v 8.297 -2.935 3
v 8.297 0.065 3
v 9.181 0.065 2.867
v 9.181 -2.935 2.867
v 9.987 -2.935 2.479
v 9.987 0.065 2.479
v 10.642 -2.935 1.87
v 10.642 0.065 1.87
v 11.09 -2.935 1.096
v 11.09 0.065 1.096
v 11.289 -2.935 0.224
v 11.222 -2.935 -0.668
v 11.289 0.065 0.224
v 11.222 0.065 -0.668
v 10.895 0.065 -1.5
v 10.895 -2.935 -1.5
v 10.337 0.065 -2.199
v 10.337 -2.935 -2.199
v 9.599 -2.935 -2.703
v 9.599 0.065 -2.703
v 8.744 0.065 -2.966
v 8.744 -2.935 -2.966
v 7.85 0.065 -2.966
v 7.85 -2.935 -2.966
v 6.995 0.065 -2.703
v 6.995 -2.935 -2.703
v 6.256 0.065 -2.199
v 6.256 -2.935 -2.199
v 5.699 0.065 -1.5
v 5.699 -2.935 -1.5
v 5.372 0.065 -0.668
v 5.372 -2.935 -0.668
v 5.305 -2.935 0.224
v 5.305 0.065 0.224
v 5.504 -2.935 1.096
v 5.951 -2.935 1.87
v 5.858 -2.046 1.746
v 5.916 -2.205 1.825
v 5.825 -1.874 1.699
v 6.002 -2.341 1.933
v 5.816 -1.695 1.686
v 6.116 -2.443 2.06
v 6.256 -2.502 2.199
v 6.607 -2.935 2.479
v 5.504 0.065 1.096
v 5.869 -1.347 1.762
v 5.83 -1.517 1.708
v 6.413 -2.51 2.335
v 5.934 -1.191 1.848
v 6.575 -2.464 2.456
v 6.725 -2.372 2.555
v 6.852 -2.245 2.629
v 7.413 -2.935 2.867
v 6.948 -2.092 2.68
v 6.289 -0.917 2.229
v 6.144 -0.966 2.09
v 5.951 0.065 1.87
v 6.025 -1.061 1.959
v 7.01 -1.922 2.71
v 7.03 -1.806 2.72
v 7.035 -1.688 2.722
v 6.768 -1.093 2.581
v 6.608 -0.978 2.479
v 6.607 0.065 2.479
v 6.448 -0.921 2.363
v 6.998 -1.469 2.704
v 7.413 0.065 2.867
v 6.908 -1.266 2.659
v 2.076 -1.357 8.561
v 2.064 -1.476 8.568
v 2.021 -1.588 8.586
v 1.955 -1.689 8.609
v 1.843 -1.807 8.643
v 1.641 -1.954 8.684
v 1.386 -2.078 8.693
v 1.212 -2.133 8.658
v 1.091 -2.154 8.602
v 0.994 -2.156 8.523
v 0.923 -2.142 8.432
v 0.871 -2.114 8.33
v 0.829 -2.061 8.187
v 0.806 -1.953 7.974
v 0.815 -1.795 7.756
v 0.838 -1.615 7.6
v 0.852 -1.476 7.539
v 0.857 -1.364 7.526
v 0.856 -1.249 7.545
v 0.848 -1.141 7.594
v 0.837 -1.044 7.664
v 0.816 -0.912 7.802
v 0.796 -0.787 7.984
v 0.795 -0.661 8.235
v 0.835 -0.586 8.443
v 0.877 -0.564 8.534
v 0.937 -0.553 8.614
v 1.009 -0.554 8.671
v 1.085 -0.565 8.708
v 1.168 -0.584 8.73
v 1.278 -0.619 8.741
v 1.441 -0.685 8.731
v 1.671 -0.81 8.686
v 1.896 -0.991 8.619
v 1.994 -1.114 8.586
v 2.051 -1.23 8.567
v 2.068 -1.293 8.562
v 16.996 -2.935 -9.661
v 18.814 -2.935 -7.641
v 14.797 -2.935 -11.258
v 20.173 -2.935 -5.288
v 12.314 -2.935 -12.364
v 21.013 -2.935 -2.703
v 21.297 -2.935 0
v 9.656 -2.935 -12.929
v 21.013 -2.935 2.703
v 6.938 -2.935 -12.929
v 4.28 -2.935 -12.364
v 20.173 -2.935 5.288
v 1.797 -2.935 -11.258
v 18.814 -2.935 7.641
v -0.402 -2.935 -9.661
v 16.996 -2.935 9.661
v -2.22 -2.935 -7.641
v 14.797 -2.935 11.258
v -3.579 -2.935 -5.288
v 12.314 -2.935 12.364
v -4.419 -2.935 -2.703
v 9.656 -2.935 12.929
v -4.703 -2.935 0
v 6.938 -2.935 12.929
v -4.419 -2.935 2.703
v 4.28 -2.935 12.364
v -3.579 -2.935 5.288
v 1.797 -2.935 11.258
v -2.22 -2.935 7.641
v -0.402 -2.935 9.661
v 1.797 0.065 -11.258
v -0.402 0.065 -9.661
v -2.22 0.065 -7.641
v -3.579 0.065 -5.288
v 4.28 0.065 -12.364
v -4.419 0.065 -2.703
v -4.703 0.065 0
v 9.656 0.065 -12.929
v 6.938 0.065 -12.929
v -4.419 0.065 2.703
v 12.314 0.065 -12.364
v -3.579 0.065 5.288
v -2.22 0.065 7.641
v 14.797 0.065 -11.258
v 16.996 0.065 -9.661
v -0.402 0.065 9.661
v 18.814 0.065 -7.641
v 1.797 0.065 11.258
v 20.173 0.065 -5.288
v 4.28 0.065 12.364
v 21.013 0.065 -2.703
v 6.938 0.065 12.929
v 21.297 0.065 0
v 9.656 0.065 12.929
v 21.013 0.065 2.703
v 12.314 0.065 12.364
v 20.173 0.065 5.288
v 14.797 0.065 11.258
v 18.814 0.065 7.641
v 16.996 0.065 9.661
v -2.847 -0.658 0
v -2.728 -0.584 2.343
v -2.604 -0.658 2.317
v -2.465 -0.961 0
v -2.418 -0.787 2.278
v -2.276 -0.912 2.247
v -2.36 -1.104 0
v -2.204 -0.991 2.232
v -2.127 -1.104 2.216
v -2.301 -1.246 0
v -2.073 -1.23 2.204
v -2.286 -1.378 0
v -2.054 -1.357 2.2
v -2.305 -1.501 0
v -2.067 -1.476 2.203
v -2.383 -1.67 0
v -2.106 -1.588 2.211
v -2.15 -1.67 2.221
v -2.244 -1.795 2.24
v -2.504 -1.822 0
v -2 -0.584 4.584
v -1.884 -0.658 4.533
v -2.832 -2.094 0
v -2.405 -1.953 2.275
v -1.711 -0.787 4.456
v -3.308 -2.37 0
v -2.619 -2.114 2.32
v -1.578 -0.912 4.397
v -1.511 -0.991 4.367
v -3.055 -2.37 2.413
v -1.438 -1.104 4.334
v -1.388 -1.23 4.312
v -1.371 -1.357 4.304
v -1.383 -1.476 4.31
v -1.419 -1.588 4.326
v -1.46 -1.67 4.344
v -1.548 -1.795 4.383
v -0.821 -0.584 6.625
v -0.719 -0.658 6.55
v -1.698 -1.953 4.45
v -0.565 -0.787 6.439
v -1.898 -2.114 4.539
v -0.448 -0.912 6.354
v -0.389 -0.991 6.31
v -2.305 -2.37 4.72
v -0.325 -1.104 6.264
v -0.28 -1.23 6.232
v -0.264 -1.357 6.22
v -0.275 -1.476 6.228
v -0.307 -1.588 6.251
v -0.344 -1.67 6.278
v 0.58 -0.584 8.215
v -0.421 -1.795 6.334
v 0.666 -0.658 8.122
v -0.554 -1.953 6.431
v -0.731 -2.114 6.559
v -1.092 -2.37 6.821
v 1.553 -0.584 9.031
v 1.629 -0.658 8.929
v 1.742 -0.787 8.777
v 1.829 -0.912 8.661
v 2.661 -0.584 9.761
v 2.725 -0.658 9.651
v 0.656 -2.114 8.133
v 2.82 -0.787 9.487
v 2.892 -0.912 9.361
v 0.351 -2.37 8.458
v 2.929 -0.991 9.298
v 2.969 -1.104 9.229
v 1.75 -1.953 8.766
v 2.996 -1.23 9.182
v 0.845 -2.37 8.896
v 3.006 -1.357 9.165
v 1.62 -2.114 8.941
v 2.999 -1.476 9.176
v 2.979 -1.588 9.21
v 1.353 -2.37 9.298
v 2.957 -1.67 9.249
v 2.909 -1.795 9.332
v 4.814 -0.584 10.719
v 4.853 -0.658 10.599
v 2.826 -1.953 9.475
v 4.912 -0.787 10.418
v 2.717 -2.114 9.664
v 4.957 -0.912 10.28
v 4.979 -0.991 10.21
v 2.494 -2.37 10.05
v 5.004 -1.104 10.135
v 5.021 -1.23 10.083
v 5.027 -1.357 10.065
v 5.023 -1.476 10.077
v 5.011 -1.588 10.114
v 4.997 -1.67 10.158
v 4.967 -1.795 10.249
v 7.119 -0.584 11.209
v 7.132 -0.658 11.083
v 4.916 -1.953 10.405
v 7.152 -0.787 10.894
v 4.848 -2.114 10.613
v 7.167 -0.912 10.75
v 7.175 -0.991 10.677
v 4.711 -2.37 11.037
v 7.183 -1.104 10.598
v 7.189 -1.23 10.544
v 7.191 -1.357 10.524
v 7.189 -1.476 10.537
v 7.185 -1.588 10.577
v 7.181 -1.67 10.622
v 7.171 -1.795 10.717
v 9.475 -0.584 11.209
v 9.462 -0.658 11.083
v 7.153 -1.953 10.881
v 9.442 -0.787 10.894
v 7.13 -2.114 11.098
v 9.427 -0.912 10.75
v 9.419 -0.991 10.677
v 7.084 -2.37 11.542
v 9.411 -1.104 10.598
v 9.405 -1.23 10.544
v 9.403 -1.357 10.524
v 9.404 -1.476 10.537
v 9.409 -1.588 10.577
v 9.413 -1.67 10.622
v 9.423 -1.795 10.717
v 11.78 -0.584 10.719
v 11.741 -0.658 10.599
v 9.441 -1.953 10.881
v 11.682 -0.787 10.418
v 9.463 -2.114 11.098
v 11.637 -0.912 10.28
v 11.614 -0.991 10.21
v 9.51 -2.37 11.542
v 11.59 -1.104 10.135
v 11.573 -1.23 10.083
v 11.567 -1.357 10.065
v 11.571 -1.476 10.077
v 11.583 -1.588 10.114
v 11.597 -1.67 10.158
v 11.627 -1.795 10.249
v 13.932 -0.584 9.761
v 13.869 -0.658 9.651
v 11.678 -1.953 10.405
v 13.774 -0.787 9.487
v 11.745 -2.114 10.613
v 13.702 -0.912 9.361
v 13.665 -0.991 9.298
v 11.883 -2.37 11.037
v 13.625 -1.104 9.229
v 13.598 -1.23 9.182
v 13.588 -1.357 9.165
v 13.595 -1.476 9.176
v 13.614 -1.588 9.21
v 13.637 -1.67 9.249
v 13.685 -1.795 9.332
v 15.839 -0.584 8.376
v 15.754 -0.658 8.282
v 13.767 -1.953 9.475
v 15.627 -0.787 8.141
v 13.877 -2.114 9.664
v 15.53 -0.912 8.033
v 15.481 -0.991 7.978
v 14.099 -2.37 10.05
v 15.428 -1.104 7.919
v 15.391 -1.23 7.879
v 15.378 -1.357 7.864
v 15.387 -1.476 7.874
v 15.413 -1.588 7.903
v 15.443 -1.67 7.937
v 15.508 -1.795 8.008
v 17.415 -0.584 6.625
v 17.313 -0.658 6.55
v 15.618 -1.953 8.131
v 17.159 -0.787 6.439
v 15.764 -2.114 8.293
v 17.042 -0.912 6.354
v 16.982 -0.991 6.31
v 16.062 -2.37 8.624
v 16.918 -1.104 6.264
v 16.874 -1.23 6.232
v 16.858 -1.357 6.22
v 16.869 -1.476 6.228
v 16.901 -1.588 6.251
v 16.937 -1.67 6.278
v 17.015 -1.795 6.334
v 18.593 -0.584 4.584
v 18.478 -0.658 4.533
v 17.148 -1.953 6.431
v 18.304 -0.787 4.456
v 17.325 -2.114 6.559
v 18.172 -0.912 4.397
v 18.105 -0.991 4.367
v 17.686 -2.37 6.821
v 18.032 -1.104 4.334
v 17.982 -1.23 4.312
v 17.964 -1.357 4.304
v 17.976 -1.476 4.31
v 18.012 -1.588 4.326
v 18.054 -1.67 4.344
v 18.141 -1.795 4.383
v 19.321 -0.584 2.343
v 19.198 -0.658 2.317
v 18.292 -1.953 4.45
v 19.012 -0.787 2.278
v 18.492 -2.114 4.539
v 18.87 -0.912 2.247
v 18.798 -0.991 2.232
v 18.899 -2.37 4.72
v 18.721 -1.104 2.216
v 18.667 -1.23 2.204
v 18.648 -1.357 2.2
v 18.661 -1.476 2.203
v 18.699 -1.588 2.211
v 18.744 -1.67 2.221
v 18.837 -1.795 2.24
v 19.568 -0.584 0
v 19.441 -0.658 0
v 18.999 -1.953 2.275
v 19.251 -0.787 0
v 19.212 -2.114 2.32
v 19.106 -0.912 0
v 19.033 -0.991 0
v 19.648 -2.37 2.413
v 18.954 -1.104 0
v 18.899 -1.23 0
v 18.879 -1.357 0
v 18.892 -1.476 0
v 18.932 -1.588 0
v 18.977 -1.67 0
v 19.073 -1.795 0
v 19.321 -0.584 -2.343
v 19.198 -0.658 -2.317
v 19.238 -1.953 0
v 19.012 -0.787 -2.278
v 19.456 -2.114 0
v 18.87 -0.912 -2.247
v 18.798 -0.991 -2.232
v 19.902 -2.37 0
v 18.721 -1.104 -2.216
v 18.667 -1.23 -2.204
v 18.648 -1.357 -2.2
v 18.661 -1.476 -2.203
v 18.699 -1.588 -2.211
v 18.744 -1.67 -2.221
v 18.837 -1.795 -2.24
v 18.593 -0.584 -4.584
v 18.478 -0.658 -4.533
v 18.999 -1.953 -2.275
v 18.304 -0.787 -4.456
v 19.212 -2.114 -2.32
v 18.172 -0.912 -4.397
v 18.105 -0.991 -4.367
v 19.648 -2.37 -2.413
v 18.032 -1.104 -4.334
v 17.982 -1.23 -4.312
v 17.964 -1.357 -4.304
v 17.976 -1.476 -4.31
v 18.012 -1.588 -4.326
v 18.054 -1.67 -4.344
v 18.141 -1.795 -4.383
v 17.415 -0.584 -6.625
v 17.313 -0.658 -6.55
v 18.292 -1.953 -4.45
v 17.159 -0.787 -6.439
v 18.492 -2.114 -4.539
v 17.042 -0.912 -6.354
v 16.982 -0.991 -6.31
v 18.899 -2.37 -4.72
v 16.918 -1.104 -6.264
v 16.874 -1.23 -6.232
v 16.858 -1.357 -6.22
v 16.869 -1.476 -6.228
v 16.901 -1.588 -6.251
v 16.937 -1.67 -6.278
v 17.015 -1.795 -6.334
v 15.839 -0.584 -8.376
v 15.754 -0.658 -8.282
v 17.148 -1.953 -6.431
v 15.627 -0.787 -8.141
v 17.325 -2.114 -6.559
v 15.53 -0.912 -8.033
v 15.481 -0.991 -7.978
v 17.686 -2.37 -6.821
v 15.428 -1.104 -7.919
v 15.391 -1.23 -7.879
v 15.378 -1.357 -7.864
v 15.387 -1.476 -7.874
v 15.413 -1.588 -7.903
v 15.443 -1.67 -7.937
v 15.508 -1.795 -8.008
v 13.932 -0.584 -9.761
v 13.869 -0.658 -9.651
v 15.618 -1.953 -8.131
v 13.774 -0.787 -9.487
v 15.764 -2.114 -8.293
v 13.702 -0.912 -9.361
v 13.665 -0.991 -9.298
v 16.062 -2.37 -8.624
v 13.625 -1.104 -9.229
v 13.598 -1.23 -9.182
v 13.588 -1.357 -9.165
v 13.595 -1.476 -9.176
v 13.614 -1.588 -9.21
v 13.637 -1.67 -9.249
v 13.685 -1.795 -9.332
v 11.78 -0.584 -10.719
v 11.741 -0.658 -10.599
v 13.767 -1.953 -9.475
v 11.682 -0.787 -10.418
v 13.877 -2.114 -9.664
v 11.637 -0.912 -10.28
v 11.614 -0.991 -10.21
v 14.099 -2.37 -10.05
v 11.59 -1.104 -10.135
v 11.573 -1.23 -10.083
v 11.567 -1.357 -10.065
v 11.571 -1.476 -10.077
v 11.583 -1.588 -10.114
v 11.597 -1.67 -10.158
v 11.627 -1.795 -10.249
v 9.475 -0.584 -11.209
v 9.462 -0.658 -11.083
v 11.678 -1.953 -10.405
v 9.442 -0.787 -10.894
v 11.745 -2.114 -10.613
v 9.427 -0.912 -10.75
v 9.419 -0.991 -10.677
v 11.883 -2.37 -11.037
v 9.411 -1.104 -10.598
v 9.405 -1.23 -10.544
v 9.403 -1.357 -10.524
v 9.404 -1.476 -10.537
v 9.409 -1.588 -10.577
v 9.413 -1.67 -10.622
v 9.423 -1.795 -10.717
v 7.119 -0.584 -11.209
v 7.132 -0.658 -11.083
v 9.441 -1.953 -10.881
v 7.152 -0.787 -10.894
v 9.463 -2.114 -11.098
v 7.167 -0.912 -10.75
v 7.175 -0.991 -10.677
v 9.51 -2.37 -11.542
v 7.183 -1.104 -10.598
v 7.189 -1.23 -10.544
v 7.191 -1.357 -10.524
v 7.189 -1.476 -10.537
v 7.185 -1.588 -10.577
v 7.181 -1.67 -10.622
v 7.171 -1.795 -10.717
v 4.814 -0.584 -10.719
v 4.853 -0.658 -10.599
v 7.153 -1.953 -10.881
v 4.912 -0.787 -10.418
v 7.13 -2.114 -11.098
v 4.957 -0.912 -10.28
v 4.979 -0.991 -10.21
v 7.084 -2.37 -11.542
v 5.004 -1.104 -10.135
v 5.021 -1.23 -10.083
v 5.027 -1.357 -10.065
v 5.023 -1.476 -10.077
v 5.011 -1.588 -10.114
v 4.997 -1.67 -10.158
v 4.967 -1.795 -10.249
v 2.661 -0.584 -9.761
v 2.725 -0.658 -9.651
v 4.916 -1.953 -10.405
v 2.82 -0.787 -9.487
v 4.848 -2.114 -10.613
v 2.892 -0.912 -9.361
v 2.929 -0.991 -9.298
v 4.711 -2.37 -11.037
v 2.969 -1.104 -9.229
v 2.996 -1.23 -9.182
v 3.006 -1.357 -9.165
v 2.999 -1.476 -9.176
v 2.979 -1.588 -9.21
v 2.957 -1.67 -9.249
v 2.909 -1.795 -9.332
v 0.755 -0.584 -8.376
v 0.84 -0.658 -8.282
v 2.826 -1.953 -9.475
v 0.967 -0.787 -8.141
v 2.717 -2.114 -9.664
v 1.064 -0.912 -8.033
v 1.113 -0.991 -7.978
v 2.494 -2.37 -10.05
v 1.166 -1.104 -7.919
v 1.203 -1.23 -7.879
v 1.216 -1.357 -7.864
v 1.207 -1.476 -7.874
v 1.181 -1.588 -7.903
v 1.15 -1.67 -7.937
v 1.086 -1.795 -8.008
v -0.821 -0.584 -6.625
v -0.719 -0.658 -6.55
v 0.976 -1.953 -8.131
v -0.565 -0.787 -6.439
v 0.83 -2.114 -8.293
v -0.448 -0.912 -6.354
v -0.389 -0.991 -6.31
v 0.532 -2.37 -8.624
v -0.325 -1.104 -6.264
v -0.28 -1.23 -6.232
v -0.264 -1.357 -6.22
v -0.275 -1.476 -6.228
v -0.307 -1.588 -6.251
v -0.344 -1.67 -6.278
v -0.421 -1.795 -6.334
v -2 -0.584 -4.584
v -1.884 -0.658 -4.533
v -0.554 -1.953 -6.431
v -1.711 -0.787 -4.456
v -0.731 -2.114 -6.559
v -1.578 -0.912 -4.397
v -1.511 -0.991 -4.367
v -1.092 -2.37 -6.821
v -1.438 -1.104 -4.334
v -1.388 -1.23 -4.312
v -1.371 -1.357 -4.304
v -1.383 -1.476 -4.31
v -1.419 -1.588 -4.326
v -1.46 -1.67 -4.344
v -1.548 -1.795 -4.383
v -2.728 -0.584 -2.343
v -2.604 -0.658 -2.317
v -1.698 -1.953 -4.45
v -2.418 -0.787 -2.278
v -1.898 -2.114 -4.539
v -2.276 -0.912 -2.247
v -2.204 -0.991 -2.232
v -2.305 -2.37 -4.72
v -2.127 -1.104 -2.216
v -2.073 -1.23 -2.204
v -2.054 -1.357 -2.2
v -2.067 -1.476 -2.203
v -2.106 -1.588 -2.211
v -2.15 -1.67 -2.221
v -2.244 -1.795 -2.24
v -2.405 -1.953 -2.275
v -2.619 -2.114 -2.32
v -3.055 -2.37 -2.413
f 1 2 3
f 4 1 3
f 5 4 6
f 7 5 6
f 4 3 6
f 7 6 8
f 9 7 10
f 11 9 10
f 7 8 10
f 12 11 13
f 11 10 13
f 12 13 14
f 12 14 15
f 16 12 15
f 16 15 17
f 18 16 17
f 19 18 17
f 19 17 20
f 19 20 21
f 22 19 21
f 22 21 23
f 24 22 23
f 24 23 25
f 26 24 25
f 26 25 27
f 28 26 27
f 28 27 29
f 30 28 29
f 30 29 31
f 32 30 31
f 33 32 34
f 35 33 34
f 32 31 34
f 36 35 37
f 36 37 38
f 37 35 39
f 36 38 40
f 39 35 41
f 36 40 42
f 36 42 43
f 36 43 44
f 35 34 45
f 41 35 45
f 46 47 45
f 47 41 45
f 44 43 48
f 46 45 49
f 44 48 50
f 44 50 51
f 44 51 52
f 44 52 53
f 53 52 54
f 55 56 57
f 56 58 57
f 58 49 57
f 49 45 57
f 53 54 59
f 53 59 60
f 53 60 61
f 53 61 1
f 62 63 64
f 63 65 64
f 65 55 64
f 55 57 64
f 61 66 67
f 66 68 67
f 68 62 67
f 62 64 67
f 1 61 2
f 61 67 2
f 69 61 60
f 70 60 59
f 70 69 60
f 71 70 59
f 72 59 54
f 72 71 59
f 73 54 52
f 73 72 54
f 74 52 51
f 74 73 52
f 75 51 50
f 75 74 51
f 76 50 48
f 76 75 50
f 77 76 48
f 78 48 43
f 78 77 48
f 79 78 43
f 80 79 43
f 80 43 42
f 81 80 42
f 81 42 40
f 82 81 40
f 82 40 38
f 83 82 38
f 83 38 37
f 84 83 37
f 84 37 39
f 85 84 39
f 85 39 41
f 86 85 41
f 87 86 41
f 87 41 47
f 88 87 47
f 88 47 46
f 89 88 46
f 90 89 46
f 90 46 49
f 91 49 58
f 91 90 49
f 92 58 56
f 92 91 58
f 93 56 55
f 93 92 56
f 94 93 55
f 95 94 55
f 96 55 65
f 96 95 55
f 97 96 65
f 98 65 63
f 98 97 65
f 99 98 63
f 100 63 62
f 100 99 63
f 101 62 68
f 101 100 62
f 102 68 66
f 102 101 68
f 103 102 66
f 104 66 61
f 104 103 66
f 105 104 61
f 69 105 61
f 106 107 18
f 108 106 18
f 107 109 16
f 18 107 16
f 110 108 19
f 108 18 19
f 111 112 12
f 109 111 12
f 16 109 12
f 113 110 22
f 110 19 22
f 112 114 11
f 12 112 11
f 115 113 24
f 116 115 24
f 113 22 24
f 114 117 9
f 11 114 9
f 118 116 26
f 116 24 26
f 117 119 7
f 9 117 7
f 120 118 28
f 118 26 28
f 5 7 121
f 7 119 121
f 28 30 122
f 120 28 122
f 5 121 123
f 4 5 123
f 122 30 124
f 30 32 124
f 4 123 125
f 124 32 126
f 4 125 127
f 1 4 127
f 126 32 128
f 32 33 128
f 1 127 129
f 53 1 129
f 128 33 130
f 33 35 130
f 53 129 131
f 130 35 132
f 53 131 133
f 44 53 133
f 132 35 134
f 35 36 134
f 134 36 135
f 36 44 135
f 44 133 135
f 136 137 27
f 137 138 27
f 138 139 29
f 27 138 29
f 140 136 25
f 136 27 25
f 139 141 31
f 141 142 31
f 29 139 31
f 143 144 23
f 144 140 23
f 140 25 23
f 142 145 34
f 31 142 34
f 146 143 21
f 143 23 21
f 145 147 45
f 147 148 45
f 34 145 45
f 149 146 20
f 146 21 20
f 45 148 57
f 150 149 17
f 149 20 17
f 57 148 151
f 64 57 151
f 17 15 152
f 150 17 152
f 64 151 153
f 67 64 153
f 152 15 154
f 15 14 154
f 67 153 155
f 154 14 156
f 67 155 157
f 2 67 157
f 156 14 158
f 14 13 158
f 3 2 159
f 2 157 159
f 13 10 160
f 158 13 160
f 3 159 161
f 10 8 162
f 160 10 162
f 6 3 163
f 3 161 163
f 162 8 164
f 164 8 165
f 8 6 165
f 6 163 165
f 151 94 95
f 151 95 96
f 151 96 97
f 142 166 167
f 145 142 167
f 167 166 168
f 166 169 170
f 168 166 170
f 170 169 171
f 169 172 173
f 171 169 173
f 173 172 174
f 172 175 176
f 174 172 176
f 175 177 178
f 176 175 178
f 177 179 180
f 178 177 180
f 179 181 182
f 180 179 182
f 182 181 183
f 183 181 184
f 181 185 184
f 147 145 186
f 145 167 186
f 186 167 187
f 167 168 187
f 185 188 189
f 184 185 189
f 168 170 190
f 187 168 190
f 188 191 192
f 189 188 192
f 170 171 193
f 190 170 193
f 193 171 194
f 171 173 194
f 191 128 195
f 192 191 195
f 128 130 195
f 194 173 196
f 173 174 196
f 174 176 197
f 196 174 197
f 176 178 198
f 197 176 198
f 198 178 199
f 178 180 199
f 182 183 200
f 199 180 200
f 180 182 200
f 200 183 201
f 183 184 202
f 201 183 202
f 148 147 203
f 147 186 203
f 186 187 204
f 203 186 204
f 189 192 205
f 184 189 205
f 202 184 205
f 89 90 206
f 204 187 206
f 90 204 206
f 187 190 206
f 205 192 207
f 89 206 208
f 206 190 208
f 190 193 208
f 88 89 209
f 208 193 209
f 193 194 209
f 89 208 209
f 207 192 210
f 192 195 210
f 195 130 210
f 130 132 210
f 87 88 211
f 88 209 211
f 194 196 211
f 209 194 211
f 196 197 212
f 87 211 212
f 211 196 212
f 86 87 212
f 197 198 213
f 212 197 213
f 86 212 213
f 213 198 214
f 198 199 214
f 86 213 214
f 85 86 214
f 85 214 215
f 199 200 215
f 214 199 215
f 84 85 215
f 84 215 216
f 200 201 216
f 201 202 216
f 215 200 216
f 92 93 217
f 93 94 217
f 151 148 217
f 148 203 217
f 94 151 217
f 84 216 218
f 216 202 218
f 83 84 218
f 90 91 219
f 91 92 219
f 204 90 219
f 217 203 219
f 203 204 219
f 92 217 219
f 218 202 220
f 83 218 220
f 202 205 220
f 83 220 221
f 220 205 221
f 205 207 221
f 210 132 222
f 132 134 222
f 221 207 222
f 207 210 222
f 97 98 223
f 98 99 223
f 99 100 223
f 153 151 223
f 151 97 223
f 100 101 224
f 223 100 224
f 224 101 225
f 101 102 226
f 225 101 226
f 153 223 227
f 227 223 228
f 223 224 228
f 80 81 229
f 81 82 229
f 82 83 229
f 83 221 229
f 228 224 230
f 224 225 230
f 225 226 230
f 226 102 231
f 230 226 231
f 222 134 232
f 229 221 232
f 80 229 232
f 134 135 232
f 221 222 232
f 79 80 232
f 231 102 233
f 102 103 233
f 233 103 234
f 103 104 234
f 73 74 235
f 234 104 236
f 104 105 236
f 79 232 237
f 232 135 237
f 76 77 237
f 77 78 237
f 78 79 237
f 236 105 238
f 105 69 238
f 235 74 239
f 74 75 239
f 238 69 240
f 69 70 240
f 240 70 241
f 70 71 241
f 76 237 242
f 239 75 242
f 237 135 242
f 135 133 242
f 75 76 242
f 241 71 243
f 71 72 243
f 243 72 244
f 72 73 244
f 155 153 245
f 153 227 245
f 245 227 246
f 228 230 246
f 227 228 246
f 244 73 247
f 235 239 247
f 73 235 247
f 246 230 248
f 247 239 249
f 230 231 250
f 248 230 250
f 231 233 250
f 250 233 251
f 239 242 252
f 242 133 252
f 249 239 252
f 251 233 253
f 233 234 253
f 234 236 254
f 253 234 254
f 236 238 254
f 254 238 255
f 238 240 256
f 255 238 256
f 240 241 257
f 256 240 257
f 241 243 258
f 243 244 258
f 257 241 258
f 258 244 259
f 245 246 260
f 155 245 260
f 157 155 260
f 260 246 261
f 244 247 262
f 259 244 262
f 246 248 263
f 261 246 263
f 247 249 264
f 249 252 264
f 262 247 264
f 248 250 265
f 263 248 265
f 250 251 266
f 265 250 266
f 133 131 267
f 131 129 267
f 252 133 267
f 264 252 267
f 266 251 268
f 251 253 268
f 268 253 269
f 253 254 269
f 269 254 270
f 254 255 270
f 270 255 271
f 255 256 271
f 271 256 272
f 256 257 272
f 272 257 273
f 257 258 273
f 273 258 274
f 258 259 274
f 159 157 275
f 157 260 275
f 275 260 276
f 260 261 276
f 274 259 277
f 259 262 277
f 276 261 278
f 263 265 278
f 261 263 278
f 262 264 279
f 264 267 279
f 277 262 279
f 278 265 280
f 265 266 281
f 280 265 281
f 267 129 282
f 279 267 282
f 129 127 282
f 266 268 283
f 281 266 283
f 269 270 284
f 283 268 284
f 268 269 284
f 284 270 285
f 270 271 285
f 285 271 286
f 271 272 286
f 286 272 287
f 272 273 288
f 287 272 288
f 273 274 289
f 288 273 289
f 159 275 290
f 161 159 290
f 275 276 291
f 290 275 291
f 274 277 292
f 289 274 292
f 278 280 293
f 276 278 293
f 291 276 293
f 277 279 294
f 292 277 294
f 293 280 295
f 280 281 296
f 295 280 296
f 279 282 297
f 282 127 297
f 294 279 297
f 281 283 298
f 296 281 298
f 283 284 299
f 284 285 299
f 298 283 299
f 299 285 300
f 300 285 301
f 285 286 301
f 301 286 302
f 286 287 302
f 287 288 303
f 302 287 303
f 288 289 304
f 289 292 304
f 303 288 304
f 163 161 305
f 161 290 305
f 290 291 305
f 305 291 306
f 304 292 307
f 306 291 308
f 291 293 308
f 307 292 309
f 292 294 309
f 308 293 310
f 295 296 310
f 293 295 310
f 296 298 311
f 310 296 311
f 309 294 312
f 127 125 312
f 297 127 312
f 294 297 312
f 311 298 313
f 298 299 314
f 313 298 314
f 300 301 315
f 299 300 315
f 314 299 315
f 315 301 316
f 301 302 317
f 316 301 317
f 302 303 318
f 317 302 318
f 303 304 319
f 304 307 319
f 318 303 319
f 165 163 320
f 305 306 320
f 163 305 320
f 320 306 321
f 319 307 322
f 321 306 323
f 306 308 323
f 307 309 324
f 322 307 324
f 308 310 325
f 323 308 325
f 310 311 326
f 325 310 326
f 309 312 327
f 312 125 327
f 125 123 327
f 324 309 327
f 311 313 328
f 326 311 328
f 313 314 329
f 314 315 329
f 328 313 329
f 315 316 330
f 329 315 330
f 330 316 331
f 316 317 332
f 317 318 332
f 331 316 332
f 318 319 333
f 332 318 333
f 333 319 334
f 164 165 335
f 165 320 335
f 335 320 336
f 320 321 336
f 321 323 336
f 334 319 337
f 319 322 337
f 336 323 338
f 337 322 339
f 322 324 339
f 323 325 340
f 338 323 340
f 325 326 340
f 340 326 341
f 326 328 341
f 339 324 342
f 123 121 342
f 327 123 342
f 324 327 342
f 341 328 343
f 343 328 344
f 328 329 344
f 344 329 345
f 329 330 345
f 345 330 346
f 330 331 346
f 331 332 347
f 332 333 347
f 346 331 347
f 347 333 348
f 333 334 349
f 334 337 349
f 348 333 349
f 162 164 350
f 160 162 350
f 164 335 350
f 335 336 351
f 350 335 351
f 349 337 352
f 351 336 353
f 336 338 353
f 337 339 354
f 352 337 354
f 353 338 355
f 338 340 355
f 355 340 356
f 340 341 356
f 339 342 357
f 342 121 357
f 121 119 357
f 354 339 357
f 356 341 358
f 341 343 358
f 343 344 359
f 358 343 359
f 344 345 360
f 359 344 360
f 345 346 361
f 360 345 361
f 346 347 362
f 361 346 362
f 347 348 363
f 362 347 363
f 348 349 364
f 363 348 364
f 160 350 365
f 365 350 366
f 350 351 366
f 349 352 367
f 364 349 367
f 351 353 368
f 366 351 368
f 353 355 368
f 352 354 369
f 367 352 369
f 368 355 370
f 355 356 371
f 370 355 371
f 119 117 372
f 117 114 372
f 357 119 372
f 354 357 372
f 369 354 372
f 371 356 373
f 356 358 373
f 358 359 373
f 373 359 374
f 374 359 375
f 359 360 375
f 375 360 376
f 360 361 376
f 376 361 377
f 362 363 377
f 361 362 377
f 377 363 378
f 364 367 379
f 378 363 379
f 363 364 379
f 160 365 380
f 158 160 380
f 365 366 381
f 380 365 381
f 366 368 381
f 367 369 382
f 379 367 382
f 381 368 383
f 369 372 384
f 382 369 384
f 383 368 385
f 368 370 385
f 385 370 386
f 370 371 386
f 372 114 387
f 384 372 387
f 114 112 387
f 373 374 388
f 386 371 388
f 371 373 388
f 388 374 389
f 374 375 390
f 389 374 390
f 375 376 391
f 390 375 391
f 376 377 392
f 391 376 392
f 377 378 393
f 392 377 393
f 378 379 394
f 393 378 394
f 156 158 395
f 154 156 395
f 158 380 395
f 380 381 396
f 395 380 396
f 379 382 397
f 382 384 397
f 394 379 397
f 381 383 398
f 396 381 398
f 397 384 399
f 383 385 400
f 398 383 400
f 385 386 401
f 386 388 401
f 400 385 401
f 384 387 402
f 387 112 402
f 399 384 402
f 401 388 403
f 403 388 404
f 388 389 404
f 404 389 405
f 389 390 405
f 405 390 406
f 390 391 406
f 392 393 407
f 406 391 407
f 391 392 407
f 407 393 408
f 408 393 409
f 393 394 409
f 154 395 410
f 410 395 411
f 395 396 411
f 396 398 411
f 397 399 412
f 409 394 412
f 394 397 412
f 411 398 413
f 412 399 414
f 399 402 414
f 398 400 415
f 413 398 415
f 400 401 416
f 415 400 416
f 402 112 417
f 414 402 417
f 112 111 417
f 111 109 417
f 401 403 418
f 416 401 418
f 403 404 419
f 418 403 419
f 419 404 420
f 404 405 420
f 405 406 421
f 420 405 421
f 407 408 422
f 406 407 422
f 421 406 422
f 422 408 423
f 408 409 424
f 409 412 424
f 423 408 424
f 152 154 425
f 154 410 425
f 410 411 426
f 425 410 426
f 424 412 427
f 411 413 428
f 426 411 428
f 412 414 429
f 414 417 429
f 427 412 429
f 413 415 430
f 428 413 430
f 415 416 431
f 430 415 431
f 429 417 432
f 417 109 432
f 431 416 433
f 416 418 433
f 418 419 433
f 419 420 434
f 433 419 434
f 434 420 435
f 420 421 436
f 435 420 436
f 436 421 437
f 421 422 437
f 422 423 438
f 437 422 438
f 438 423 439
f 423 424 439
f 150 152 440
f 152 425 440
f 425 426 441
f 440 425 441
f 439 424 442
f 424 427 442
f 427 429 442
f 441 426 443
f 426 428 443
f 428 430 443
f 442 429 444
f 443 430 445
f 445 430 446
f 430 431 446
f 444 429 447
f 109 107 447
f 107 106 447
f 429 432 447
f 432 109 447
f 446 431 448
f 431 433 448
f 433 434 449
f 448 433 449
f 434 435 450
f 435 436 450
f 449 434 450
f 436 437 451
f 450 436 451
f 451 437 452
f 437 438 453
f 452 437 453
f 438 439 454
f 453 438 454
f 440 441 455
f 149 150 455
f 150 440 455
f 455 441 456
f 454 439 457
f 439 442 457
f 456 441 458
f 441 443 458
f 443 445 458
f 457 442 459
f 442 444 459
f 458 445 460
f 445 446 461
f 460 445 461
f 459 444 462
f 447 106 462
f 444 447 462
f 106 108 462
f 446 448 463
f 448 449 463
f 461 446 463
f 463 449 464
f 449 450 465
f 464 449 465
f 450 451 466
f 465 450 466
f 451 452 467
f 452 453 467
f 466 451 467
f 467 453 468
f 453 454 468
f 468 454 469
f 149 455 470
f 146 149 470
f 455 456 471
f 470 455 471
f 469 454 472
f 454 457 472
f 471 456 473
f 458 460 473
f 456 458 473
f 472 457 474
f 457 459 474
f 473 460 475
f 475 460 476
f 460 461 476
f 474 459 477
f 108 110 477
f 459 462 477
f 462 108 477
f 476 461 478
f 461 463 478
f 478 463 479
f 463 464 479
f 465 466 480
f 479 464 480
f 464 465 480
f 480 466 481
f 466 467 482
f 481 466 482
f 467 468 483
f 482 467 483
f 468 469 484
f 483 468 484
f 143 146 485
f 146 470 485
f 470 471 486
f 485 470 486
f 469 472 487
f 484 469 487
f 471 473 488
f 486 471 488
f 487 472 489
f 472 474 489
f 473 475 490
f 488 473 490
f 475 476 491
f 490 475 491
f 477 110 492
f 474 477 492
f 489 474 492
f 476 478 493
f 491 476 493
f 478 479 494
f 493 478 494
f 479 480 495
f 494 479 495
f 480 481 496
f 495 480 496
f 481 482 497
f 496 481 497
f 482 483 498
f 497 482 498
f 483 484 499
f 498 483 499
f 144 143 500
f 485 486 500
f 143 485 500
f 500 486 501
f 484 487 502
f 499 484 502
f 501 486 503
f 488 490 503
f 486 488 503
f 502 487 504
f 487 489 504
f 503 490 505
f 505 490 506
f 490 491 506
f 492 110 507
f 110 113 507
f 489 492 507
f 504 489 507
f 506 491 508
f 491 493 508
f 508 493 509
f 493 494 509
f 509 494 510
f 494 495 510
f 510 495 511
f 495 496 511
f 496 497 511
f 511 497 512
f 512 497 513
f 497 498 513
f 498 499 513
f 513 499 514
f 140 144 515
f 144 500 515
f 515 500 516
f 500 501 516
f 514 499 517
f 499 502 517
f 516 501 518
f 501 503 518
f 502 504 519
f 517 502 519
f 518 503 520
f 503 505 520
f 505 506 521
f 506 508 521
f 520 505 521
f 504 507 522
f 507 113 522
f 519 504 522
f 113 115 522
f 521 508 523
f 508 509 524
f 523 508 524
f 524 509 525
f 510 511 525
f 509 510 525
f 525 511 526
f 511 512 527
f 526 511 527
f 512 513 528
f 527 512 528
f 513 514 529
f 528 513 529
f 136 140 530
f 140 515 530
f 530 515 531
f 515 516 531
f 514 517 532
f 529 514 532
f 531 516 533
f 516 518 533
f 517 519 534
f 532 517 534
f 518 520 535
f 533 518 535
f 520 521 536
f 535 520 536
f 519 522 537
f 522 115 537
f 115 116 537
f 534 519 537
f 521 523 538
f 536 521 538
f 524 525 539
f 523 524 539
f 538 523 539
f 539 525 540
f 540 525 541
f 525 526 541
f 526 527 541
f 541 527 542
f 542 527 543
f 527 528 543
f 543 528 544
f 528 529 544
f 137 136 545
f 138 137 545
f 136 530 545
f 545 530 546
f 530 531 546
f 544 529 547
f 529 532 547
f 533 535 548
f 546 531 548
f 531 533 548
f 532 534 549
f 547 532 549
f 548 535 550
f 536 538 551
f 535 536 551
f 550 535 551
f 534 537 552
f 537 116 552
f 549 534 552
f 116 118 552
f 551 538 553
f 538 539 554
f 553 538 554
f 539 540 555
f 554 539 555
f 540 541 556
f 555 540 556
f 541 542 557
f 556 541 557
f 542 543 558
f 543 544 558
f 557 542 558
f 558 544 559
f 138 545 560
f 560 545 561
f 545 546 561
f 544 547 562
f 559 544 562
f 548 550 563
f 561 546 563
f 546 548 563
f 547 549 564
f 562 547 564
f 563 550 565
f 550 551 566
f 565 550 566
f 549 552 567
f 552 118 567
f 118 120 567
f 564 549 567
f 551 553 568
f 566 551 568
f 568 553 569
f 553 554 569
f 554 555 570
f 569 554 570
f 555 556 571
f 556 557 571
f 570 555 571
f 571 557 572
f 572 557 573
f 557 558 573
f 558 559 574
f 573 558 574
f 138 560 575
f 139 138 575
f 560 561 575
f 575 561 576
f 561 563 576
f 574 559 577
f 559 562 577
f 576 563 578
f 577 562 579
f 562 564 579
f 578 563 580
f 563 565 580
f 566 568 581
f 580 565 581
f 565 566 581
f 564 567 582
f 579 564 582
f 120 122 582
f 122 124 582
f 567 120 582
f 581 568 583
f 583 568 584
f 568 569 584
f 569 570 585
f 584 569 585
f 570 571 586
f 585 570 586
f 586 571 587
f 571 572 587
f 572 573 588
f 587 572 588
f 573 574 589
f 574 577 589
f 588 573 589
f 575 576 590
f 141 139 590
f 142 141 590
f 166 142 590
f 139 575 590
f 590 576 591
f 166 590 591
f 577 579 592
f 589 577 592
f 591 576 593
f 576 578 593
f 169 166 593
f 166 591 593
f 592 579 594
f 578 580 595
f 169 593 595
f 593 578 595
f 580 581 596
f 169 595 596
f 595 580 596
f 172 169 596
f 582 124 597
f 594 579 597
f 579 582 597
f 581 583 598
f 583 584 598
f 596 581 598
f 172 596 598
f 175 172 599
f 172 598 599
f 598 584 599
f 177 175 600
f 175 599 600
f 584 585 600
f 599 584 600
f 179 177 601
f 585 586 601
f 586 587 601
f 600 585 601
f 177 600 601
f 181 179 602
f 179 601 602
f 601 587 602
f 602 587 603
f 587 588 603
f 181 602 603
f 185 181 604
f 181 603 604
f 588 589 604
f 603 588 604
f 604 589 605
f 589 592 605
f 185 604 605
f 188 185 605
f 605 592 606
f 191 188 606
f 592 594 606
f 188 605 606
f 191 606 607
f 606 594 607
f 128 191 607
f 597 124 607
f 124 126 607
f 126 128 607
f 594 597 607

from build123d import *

# Parameters (mm, degrees)
SKETCH117_R                   = 3
CUT_EXTRUDE4_DEPTH            = 3
M2X0_4_START                  = -5.931289347
M2X0_4_TAPPED_HOLE1_OUTLINE_R = 0.8
M2X0_4_TAPPED_HOLE1_DEPTH     = 8.484952251


# Read off the part's stored shape, not the designer's step: M2x0.4 Tapped Hole1
with BuildPart() as part:
    # Sketch9 → Revolve1 (revolve)
    with BuildSketch(Plane.XY):
        with BuildLine():
            Line((-4.703089141, -2.935363462), (8.296910859, -2.935363462))
            Line((8.296910859, -2.935363462), (8.296910859, 0.064636538))
            Line((8.296910859, 0.064636538), (-4.703089141, 0.064636538))
            add(Edge.make_bspline(
                [(-4.703089141, 0.064636538), (0.132127885, -1.294166307), (-4.703089141, -2.935363462)],
                knots=[0, 0, 0, 1, 1, 1], degree=2))
        make_face()
    revolve(axis=Axis((8.296910859, -2.935363462, 0), (0, 1, 0)))

    # Sketch117 → Cut-Extrude4 (cut)
    with BuildSketch(Plane(origin=(0, 0.064636538, 0), x_dir=(1, 0, 0), z_dir=(0, 1, 0))):
        with Locations(Location((8.29691086, 0, 0), (0, 0, 270))):
            Circle(SKETCH117_R)
    extrude(amount=-CUT_EXTRUDE4_DEPTH, mode=Mode.SUBTRACT)

    # M2x0.4 Tapped Hole1 outline → M2x0.4 Tapped Hole1 (cut)
    with BuildSketch(Plane(origin=(0, 0, 0), x_dir=(0.7627522743476953, 0.03658875504667491, 0.6456548853540508), z_dir=(0.6466907823507446, -0.04315533310364318, -0.7615304650815327)).offset(M2X0_4_START)):
        with Locations((6.261089871, 1.839084068)):
            Circle(M2X0_4_TAPPED_HOLE1_OUTLINE_R)
    extrude(amount=M2X0_4_TAPPED_HOLE1_DEPTH, mode=Mode.SUBTRACT)


solid = part.part
